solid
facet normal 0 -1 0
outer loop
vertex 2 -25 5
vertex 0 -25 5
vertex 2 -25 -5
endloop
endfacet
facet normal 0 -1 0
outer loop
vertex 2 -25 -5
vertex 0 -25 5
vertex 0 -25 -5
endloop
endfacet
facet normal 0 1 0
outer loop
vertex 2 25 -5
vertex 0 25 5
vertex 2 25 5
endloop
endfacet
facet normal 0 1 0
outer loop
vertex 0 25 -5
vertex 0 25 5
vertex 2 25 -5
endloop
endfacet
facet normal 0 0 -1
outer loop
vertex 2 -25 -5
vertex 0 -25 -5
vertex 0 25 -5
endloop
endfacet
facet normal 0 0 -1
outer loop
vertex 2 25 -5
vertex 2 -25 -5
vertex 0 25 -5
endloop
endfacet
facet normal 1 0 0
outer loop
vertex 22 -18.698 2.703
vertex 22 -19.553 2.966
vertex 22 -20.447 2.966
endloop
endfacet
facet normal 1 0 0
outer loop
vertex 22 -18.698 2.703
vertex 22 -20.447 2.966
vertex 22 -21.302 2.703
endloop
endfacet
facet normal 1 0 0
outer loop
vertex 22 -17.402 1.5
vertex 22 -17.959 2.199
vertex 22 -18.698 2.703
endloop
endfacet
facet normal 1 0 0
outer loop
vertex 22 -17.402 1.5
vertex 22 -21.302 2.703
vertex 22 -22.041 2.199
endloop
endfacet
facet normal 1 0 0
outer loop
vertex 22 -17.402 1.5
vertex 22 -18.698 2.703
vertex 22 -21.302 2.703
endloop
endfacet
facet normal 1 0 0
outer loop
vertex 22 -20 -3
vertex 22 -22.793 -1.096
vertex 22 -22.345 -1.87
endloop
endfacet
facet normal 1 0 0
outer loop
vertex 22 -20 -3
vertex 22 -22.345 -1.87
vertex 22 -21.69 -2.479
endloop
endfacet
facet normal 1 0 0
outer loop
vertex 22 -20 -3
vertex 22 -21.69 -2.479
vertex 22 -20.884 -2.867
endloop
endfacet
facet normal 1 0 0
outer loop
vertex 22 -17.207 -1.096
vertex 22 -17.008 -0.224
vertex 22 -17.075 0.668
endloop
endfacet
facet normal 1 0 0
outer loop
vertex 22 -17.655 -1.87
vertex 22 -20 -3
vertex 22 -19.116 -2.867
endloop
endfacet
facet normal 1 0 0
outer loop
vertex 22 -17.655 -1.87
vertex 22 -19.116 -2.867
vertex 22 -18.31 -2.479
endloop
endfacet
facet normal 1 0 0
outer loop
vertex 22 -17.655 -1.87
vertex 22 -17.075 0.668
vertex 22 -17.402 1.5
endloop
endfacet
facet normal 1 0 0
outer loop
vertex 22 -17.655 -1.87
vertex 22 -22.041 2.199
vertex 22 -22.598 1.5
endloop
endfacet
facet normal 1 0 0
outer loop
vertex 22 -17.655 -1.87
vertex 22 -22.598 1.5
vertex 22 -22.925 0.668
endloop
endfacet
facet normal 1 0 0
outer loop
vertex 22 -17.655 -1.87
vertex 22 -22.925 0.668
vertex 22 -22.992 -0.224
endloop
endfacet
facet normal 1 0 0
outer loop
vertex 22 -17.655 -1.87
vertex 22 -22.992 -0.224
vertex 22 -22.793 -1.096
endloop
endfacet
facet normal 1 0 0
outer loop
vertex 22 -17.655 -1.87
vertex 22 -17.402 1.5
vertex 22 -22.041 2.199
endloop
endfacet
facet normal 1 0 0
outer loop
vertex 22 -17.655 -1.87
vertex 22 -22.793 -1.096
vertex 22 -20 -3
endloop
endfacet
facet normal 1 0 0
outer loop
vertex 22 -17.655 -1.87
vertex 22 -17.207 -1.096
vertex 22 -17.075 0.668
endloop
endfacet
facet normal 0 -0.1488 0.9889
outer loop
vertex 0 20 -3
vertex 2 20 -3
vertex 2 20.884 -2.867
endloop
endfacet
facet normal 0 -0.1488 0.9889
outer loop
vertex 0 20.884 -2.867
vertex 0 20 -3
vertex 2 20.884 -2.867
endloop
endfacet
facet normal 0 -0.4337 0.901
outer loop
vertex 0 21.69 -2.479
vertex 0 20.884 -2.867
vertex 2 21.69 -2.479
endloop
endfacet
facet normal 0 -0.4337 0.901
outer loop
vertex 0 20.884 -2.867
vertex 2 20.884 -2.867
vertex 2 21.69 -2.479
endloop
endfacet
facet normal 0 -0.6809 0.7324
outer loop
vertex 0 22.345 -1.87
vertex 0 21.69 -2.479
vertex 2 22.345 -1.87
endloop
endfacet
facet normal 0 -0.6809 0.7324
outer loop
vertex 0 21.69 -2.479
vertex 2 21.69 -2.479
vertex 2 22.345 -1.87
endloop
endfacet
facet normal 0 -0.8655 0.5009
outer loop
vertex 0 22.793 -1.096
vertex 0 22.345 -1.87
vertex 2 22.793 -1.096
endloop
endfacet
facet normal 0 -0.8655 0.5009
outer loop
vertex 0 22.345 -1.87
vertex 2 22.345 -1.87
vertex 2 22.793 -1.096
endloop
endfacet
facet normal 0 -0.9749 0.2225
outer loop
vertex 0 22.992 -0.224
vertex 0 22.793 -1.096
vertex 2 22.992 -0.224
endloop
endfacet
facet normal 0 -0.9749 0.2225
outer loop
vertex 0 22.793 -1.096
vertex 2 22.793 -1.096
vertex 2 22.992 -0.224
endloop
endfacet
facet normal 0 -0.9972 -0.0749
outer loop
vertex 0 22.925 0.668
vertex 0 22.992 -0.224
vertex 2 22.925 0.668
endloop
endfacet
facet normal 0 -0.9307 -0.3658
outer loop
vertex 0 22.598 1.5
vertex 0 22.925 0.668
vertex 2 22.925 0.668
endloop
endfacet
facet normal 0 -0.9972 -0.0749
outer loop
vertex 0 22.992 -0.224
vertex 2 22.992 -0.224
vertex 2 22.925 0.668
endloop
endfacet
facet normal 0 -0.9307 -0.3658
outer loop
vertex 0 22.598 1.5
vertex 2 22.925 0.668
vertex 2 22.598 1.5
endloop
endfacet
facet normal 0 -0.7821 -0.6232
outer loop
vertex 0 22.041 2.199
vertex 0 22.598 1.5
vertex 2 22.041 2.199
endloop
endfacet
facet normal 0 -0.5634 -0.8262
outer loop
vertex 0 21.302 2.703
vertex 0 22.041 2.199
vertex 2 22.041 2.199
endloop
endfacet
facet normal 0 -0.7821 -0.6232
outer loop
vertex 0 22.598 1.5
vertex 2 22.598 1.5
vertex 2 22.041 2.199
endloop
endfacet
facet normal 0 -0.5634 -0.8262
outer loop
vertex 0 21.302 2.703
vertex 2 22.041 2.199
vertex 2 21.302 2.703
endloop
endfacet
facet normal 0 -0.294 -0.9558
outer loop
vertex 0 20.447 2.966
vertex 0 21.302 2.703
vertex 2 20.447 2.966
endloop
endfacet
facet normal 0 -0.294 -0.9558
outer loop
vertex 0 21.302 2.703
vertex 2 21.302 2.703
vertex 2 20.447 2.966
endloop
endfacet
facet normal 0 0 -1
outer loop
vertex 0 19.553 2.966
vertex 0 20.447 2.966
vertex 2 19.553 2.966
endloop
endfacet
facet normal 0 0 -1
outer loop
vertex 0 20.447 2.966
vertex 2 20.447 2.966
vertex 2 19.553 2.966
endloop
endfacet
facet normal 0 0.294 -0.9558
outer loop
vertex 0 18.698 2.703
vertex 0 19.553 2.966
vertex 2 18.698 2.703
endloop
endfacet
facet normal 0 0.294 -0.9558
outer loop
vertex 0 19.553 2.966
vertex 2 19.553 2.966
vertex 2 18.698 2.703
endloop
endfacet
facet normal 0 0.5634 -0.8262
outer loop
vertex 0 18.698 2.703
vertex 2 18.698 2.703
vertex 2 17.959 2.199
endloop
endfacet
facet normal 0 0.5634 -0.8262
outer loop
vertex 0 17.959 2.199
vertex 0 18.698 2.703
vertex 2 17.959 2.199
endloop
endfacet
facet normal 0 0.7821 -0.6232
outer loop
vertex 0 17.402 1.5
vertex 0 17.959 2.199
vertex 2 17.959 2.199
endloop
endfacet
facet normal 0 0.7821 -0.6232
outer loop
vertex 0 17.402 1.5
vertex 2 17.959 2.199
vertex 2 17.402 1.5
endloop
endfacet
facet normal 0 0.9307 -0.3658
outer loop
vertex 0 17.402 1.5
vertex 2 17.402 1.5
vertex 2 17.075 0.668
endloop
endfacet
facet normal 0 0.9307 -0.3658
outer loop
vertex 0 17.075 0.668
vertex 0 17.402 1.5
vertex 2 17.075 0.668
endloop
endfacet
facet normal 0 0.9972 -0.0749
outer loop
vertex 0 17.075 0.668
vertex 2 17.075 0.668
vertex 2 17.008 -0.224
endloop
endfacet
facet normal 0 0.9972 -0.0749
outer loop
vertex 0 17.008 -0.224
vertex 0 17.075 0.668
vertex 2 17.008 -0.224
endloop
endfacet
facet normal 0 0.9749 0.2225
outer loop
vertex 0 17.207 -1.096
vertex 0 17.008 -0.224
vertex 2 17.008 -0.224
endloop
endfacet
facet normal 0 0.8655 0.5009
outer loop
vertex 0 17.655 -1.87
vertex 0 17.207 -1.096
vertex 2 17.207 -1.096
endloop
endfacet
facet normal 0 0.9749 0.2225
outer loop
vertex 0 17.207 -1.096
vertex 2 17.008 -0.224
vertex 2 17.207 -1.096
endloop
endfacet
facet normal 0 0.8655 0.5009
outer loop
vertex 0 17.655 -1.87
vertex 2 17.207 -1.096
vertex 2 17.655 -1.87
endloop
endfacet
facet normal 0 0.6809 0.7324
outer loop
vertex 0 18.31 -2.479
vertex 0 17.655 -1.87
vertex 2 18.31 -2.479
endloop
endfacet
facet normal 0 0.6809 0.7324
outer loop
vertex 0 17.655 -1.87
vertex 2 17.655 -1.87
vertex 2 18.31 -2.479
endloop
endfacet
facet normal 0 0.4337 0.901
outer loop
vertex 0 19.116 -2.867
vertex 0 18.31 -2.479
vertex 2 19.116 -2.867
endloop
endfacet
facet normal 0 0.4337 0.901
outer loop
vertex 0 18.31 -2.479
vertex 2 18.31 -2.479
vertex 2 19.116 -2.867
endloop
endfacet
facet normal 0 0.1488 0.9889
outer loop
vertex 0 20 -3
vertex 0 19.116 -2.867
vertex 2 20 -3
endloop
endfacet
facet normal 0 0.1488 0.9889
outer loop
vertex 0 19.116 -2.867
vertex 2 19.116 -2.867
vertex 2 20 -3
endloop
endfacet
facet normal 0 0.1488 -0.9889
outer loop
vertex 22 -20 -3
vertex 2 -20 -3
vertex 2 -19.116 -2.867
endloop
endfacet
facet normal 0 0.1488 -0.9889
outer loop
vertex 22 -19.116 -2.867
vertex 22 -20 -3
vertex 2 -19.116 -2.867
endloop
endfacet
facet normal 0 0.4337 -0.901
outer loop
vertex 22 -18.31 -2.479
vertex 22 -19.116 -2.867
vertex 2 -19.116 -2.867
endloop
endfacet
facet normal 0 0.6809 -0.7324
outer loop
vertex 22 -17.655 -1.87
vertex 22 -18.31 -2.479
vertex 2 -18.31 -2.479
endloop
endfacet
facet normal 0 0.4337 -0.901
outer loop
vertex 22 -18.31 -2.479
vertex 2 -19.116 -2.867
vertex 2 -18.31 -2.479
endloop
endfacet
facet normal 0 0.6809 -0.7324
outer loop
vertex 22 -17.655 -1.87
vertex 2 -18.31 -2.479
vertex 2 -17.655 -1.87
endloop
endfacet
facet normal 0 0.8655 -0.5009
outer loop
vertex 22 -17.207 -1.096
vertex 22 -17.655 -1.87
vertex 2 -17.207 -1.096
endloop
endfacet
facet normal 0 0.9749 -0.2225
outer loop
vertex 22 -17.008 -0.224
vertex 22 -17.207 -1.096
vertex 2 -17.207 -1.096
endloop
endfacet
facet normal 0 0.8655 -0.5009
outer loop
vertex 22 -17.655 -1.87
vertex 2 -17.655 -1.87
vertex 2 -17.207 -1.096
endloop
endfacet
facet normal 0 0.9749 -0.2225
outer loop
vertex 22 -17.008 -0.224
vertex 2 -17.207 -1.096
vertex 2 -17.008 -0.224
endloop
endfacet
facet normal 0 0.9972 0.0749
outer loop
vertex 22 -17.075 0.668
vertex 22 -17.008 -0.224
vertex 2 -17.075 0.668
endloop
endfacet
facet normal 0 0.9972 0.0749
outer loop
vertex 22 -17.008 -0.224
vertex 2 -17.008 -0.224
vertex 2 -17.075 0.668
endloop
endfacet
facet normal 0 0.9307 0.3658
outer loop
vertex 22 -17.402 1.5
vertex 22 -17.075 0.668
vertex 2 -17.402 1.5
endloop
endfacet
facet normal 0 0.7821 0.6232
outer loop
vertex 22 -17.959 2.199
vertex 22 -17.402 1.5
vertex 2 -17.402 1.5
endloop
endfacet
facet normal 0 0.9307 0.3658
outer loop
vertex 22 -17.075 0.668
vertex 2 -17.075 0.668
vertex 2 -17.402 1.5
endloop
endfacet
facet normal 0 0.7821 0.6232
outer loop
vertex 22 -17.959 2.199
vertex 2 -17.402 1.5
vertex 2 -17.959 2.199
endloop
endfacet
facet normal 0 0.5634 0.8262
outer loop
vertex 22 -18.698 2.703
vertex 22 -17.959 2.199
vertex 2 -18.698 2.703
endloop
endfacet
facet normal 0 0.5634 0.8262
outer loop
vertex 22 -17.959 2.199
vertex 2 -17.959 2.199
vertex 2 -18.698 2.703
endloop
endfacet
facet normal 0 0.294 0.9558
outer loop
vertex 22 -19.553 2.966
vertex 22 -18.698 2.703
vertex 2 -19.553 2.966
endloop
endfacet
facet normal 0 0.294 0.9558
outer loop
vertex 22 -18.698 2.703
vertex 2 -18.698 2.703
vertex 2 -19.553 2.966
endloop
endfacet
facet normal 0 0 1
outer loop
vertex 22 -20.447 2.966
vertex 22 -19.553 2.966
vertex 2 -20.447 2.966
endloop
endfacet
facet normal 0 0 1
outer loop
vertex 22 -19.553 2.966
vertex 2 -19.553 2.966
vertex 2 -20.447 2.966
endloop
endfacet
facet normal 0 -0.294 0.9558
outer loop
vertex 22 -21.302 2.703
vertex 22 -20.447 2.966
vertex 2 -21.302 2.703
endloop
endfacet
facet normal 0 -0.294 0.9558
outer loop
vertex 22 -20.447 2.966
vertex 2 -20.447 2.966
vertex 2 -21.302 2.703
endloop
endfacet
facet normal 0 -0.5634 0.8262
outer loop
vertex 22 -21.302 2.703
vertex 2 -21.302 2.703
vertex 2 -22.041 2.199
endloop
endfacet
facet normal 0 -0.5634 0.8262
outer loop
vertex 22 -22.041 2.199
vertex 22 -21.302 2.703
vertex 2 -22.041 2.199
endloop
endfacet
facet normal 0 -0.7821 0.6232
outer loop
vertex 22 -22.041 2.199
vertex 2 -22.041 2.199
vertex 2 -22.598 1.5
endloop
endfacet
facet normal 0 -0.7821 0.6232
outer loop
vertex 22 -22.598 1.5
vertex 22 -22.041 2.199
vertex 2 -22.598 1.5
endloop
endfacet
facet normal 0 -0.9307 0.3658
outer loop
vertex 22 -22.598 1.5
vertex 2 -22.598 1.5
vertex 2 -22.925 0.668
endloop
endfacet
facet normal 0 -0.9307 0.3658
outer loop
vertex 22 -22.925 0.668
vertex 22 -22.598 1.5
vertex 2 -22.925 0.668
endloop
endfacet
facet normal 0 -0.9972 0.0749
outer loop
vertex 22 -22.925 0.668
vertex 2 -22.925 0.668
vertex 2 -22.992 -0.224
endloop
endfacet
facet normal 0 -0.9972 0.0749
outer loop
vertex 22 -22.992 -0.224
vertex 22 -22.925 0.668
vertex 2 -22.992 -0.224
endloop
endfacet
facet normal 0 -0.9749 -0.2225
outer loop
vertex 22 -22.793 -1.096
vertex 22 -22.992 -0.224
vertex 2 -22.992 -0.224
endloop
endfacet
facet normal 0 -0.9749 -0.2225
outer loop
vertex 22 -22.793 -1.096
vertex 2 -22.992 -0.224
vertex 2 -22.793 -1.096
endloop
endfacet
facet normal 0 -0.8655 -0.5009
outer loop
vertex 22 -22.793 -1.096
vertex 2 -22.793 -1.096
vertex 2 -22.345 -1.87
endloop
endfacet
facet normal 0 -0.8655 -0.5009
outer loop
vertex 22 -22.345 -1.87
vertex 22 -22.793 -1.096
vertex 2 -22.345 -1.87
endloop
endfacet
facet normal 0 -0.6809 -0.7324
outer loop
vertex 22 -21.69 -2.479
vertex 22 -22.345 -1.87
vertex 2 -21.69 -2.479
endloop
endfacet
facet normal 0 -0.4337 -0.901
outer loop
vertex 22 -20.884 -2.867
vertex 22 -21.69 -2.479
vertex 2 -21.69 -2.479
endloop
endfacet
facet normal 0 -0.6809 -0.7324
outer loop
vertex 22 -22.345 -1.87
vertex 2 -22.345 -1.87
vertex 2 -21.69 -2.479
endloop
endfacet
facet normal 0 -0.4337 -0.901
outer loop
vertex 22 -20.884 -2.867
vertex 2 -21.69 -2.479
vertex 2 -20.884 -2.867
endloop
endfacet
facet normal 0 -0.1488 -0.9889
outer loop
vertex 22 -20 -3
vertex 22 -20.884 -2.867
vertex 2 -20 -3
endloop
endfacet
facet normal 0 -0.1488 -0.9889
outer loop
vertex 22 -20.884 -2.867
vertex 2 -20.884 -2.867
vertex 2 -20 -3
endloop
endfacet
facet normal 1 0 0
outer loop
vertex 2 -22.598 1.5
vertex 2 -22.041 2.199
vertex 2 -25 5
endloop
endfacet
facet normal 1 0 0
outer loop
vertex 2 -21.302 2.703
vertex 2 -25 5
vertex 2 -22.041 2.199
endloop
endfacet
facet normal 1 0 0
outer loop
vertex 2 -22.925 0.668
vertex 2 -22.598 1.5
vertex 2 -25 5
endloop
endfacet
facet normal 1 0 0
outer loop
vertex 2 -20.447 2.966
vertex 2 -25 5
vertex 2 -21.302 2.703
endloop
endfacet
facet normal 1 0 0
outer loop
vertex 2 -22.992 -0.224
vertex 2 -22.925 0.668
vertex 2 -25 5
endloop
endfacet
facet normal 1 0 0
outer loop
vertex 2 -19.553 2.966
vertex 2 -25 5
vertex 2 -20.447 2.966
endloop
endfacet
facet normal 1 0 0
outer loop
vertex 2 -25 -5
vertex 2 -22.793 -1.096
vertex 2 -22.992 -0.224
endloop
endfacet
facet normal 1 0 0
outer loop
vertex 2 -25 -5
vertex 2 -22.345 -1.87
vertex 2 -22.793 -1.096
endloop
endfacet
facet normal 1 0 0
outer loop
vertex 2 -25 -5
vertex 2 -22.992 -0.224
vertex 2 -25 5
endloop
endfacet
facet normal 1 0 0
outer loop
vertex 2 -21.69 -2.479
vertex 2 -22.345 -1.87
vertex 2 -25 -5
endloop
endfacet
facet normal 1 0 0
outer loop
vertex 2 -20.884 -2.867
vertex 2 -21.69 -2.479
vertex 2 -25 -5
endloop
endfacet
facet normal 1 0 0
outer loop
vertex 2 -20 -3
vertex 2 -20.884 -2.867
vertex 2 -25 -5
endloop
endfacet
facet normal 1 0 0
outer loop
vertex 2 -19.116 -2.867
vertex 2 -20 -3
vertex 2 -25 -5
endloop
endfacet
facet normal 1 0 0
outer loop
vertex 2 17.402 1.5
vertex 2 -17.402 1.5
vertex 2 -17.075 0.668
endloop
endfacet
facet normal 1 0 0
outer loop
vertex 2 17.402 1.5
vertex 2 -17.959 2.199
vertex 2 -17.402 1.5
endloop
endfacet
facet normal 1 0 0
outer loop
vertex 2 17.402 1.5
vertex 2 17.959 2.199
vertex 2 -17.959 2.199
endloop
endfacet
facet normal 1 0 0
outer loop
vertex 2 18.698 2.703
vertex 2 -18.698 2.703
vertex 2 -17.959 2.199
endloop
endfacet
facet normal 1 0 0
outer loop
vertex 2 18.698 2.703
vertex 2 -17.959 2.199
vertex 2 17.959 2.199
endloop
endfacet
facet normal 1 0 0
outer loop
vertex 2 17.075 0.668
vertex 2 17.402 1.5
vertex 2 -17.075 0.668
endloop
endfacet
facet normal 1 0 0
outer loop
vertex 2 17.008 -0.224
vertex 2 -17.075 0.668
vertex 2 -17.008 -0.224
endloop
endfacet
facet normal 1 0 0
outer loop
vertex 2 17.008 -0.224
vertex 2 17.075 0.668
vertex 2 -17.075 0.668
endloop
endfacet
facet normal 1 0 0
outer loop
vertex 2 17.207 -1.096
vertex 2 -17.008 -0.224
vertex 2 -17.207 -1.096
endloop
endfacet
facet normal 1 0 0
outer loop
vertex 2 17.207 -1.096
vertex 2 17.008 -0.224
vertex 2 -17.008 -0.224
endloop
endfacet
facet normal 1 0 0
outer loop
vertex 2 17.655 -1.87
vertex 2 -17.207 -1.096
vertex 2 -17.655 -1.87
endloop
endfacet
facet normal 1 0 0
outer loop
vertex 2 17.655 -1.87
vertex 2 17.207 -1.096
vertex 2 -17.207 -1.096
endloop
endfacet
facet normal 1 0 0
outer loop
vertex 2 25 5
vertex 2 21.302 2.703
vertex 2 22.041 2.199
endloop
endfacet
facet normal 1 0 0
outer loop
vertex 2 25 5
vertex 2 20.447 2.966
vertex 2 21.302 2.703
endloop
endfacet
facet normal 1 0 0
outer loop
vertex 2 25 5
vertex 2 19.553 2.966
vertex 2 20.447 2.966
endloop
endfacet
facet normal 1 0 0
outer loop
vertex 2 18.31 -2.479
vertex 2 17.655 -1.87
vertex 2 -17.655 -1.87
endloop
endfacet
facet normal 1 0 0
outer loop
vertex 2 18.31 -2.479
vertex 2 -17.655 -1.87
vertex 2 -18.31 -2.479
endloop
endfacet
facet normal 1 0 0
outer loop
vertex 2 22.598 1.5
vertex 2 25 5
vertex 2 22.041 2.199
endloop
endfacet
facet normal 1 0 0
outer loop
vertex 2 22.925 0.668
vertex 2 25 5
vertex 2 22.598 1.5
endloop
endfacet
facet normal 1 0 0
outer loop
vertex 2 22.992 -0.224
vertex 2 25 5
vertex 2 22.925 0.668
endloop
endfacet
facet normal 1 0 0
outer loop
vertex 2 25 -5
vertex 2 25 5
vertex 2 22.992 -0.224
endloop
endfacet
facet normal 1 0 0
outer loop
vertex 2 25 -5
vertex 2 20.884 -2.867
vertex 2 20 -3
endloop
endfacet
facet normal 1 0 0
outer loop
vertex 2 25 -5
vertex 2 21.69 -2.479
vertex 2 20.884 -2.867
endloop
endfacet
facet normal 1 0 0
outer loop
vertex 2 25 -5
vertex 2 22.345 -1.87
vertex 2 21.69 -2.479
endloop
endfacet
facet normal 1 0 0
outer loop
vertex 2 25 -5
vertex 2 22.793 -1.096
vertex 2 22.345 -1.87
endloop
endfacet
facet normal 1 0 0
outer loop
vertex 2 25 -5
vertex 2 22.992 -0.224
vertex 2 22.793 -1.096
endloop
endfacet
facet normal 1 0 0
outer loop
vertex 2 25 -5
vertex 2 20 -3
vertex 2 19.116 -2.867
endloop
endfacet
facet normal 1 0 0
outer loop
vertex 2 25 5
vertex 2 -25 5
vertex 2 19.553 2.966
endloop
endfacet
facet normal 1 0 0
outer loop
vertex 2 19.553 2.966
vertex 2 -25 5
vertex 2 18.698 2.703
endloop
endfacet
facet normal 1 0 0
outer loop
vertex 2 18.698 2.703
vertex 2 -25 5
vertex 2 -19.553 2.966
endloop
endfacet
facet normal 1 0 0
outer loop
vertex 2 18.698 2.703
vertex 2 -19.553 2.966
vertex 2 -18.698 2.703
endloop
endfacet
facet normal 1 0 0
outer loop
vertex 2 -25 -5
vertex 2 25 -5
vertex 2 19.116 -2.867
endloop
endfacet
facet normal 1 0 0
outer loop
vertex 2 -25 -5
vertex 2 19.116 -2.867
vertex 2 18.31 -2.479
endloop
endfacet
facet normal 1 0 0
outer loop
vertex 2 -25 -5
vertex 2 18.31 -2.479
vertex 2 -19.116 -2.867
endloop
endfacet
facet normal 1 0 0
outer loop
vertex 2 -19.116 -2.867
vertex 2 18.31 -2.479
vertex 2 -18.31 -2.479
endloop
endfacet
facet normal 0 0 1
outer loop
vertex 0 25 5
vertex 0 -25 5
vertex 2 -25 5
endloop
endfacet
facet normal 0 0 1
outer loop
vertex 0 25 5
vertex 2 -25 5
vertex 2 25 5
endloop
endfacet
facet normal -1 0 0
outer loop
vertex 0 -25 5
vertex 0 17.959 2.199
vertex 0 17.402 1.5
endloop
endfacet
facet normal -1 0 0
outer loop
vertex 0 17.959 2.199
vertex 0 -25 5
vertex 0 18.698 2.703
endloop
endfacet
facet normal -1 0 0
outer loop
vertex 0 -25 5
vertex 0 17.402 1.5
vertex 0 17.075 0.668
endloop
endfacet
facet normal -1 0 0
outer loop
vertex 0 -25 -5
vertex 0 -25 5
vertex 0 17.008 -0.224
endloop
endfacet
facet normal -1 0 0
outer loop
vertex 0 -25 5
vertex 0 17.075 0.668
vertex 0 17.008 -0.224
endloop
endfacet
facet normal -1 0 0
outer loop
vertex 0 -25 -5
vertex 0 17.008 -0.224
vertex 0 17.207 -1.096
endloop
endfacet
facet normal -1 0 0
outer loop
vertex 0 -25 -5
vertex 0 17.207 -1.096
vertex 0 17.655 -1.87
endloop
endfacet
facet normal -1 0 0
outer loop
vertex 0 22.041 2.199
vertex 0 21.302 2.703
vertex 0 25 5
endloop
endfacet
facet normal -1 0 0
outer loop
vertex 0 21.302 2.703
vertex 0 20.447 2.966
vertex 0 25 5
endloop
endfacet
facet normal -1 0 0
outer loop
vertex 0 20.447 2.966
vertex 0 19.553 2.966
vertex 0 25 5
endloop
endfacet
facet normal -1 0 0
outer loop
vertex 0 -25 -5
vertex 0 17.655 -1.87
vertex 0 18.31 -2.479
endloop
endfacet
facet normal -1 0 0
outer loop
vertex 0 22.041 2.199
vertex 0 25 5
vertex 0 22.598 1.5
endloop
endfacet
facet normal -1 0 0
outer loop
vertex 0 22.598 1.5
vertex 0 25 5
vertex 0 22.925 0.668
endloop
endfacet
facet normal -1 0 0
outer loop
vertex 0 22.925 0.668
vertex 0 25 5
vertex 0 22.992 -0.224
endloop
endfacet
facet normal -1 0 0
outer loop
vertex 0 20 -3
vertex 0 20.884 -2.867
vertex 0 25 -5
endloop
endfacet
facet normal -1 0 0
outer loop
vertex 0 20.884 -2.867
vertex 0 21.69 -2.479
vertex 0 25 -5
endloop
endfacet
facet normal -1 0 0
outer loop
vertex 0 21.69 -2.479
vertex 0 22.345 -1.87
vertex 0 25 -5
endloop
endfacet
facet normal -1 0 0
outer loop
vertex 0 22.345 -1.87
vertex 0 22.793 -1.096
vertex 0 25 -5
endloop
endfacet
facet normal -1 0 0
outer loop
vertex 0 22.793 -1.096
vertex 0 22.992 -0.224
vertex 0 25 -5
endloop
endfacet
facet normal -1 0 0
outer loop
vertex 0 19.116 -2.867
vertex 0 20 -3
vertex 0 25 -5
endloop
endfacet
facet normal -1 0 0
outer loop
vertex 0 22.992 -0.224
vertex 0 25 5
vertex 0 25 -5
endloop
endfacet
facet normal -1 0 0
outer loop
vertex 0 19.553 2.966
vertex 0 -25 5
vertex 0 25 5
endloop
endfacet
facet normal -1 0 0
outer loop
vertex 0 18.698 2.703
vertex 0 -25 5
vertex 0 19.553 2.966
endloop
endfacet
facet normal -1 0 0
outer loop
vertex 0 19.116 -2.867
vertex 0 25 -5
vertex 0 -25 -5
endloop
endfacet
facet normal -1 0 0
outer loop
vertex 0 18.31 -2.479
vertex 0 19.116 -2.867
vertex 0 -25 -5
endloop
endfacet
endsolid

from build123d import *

# Parameters (mm, degrees)
SKETCH1_W           = 10
SKETCH1_H           = 50
BOSS_EXTRUDE1_DEPTH = 2
SKETCH2_R           = 3
CUT_EXTRUDE1_DEPTH  = 2
SKETCH3_R           = 3
BOSS_EXTRUDE2_DEPTH = 20


with BuildPart() as part:
    # Sketch1 → Boss-Extrude1 (new body)
    with BuildSketch(Plane(origin=(0, 0, 0), x_dir=(0, 0, -1), z_dir=(1, 0, 0))):
        Rectangle(SKETCH1_W, SKETCH1_H)
    extrude(amount=BOSS_EXTRUDE1_DEPTH)

    # Sketch2 → Cut-Extrude1 (cut)
    with BuildSketch(Plane(origin=(2, 0, 0), x_dir=(0, 0, -1), z_dir=(1, 0, 0))):
        with Locations((0, 20)):
            Circle(SKETCH2_R)
    extrude(amount=-CUT_EXTRUDE1_DEPTH, mode=Mode.SUBTRACT)

    # Sketch3 → Boss-Extrude2 (add)
    with BuildSketch(Plane(origin=(2, 0, 0), x_dir=(0, 0, -1), z_dir=(1, 0, 0))):
        with Locations((0, -20)):
            Circle(SKETCH3_R)
    extrude(amount=BOSS_EXTRUDE2_DEPTH)


solid = part.part
